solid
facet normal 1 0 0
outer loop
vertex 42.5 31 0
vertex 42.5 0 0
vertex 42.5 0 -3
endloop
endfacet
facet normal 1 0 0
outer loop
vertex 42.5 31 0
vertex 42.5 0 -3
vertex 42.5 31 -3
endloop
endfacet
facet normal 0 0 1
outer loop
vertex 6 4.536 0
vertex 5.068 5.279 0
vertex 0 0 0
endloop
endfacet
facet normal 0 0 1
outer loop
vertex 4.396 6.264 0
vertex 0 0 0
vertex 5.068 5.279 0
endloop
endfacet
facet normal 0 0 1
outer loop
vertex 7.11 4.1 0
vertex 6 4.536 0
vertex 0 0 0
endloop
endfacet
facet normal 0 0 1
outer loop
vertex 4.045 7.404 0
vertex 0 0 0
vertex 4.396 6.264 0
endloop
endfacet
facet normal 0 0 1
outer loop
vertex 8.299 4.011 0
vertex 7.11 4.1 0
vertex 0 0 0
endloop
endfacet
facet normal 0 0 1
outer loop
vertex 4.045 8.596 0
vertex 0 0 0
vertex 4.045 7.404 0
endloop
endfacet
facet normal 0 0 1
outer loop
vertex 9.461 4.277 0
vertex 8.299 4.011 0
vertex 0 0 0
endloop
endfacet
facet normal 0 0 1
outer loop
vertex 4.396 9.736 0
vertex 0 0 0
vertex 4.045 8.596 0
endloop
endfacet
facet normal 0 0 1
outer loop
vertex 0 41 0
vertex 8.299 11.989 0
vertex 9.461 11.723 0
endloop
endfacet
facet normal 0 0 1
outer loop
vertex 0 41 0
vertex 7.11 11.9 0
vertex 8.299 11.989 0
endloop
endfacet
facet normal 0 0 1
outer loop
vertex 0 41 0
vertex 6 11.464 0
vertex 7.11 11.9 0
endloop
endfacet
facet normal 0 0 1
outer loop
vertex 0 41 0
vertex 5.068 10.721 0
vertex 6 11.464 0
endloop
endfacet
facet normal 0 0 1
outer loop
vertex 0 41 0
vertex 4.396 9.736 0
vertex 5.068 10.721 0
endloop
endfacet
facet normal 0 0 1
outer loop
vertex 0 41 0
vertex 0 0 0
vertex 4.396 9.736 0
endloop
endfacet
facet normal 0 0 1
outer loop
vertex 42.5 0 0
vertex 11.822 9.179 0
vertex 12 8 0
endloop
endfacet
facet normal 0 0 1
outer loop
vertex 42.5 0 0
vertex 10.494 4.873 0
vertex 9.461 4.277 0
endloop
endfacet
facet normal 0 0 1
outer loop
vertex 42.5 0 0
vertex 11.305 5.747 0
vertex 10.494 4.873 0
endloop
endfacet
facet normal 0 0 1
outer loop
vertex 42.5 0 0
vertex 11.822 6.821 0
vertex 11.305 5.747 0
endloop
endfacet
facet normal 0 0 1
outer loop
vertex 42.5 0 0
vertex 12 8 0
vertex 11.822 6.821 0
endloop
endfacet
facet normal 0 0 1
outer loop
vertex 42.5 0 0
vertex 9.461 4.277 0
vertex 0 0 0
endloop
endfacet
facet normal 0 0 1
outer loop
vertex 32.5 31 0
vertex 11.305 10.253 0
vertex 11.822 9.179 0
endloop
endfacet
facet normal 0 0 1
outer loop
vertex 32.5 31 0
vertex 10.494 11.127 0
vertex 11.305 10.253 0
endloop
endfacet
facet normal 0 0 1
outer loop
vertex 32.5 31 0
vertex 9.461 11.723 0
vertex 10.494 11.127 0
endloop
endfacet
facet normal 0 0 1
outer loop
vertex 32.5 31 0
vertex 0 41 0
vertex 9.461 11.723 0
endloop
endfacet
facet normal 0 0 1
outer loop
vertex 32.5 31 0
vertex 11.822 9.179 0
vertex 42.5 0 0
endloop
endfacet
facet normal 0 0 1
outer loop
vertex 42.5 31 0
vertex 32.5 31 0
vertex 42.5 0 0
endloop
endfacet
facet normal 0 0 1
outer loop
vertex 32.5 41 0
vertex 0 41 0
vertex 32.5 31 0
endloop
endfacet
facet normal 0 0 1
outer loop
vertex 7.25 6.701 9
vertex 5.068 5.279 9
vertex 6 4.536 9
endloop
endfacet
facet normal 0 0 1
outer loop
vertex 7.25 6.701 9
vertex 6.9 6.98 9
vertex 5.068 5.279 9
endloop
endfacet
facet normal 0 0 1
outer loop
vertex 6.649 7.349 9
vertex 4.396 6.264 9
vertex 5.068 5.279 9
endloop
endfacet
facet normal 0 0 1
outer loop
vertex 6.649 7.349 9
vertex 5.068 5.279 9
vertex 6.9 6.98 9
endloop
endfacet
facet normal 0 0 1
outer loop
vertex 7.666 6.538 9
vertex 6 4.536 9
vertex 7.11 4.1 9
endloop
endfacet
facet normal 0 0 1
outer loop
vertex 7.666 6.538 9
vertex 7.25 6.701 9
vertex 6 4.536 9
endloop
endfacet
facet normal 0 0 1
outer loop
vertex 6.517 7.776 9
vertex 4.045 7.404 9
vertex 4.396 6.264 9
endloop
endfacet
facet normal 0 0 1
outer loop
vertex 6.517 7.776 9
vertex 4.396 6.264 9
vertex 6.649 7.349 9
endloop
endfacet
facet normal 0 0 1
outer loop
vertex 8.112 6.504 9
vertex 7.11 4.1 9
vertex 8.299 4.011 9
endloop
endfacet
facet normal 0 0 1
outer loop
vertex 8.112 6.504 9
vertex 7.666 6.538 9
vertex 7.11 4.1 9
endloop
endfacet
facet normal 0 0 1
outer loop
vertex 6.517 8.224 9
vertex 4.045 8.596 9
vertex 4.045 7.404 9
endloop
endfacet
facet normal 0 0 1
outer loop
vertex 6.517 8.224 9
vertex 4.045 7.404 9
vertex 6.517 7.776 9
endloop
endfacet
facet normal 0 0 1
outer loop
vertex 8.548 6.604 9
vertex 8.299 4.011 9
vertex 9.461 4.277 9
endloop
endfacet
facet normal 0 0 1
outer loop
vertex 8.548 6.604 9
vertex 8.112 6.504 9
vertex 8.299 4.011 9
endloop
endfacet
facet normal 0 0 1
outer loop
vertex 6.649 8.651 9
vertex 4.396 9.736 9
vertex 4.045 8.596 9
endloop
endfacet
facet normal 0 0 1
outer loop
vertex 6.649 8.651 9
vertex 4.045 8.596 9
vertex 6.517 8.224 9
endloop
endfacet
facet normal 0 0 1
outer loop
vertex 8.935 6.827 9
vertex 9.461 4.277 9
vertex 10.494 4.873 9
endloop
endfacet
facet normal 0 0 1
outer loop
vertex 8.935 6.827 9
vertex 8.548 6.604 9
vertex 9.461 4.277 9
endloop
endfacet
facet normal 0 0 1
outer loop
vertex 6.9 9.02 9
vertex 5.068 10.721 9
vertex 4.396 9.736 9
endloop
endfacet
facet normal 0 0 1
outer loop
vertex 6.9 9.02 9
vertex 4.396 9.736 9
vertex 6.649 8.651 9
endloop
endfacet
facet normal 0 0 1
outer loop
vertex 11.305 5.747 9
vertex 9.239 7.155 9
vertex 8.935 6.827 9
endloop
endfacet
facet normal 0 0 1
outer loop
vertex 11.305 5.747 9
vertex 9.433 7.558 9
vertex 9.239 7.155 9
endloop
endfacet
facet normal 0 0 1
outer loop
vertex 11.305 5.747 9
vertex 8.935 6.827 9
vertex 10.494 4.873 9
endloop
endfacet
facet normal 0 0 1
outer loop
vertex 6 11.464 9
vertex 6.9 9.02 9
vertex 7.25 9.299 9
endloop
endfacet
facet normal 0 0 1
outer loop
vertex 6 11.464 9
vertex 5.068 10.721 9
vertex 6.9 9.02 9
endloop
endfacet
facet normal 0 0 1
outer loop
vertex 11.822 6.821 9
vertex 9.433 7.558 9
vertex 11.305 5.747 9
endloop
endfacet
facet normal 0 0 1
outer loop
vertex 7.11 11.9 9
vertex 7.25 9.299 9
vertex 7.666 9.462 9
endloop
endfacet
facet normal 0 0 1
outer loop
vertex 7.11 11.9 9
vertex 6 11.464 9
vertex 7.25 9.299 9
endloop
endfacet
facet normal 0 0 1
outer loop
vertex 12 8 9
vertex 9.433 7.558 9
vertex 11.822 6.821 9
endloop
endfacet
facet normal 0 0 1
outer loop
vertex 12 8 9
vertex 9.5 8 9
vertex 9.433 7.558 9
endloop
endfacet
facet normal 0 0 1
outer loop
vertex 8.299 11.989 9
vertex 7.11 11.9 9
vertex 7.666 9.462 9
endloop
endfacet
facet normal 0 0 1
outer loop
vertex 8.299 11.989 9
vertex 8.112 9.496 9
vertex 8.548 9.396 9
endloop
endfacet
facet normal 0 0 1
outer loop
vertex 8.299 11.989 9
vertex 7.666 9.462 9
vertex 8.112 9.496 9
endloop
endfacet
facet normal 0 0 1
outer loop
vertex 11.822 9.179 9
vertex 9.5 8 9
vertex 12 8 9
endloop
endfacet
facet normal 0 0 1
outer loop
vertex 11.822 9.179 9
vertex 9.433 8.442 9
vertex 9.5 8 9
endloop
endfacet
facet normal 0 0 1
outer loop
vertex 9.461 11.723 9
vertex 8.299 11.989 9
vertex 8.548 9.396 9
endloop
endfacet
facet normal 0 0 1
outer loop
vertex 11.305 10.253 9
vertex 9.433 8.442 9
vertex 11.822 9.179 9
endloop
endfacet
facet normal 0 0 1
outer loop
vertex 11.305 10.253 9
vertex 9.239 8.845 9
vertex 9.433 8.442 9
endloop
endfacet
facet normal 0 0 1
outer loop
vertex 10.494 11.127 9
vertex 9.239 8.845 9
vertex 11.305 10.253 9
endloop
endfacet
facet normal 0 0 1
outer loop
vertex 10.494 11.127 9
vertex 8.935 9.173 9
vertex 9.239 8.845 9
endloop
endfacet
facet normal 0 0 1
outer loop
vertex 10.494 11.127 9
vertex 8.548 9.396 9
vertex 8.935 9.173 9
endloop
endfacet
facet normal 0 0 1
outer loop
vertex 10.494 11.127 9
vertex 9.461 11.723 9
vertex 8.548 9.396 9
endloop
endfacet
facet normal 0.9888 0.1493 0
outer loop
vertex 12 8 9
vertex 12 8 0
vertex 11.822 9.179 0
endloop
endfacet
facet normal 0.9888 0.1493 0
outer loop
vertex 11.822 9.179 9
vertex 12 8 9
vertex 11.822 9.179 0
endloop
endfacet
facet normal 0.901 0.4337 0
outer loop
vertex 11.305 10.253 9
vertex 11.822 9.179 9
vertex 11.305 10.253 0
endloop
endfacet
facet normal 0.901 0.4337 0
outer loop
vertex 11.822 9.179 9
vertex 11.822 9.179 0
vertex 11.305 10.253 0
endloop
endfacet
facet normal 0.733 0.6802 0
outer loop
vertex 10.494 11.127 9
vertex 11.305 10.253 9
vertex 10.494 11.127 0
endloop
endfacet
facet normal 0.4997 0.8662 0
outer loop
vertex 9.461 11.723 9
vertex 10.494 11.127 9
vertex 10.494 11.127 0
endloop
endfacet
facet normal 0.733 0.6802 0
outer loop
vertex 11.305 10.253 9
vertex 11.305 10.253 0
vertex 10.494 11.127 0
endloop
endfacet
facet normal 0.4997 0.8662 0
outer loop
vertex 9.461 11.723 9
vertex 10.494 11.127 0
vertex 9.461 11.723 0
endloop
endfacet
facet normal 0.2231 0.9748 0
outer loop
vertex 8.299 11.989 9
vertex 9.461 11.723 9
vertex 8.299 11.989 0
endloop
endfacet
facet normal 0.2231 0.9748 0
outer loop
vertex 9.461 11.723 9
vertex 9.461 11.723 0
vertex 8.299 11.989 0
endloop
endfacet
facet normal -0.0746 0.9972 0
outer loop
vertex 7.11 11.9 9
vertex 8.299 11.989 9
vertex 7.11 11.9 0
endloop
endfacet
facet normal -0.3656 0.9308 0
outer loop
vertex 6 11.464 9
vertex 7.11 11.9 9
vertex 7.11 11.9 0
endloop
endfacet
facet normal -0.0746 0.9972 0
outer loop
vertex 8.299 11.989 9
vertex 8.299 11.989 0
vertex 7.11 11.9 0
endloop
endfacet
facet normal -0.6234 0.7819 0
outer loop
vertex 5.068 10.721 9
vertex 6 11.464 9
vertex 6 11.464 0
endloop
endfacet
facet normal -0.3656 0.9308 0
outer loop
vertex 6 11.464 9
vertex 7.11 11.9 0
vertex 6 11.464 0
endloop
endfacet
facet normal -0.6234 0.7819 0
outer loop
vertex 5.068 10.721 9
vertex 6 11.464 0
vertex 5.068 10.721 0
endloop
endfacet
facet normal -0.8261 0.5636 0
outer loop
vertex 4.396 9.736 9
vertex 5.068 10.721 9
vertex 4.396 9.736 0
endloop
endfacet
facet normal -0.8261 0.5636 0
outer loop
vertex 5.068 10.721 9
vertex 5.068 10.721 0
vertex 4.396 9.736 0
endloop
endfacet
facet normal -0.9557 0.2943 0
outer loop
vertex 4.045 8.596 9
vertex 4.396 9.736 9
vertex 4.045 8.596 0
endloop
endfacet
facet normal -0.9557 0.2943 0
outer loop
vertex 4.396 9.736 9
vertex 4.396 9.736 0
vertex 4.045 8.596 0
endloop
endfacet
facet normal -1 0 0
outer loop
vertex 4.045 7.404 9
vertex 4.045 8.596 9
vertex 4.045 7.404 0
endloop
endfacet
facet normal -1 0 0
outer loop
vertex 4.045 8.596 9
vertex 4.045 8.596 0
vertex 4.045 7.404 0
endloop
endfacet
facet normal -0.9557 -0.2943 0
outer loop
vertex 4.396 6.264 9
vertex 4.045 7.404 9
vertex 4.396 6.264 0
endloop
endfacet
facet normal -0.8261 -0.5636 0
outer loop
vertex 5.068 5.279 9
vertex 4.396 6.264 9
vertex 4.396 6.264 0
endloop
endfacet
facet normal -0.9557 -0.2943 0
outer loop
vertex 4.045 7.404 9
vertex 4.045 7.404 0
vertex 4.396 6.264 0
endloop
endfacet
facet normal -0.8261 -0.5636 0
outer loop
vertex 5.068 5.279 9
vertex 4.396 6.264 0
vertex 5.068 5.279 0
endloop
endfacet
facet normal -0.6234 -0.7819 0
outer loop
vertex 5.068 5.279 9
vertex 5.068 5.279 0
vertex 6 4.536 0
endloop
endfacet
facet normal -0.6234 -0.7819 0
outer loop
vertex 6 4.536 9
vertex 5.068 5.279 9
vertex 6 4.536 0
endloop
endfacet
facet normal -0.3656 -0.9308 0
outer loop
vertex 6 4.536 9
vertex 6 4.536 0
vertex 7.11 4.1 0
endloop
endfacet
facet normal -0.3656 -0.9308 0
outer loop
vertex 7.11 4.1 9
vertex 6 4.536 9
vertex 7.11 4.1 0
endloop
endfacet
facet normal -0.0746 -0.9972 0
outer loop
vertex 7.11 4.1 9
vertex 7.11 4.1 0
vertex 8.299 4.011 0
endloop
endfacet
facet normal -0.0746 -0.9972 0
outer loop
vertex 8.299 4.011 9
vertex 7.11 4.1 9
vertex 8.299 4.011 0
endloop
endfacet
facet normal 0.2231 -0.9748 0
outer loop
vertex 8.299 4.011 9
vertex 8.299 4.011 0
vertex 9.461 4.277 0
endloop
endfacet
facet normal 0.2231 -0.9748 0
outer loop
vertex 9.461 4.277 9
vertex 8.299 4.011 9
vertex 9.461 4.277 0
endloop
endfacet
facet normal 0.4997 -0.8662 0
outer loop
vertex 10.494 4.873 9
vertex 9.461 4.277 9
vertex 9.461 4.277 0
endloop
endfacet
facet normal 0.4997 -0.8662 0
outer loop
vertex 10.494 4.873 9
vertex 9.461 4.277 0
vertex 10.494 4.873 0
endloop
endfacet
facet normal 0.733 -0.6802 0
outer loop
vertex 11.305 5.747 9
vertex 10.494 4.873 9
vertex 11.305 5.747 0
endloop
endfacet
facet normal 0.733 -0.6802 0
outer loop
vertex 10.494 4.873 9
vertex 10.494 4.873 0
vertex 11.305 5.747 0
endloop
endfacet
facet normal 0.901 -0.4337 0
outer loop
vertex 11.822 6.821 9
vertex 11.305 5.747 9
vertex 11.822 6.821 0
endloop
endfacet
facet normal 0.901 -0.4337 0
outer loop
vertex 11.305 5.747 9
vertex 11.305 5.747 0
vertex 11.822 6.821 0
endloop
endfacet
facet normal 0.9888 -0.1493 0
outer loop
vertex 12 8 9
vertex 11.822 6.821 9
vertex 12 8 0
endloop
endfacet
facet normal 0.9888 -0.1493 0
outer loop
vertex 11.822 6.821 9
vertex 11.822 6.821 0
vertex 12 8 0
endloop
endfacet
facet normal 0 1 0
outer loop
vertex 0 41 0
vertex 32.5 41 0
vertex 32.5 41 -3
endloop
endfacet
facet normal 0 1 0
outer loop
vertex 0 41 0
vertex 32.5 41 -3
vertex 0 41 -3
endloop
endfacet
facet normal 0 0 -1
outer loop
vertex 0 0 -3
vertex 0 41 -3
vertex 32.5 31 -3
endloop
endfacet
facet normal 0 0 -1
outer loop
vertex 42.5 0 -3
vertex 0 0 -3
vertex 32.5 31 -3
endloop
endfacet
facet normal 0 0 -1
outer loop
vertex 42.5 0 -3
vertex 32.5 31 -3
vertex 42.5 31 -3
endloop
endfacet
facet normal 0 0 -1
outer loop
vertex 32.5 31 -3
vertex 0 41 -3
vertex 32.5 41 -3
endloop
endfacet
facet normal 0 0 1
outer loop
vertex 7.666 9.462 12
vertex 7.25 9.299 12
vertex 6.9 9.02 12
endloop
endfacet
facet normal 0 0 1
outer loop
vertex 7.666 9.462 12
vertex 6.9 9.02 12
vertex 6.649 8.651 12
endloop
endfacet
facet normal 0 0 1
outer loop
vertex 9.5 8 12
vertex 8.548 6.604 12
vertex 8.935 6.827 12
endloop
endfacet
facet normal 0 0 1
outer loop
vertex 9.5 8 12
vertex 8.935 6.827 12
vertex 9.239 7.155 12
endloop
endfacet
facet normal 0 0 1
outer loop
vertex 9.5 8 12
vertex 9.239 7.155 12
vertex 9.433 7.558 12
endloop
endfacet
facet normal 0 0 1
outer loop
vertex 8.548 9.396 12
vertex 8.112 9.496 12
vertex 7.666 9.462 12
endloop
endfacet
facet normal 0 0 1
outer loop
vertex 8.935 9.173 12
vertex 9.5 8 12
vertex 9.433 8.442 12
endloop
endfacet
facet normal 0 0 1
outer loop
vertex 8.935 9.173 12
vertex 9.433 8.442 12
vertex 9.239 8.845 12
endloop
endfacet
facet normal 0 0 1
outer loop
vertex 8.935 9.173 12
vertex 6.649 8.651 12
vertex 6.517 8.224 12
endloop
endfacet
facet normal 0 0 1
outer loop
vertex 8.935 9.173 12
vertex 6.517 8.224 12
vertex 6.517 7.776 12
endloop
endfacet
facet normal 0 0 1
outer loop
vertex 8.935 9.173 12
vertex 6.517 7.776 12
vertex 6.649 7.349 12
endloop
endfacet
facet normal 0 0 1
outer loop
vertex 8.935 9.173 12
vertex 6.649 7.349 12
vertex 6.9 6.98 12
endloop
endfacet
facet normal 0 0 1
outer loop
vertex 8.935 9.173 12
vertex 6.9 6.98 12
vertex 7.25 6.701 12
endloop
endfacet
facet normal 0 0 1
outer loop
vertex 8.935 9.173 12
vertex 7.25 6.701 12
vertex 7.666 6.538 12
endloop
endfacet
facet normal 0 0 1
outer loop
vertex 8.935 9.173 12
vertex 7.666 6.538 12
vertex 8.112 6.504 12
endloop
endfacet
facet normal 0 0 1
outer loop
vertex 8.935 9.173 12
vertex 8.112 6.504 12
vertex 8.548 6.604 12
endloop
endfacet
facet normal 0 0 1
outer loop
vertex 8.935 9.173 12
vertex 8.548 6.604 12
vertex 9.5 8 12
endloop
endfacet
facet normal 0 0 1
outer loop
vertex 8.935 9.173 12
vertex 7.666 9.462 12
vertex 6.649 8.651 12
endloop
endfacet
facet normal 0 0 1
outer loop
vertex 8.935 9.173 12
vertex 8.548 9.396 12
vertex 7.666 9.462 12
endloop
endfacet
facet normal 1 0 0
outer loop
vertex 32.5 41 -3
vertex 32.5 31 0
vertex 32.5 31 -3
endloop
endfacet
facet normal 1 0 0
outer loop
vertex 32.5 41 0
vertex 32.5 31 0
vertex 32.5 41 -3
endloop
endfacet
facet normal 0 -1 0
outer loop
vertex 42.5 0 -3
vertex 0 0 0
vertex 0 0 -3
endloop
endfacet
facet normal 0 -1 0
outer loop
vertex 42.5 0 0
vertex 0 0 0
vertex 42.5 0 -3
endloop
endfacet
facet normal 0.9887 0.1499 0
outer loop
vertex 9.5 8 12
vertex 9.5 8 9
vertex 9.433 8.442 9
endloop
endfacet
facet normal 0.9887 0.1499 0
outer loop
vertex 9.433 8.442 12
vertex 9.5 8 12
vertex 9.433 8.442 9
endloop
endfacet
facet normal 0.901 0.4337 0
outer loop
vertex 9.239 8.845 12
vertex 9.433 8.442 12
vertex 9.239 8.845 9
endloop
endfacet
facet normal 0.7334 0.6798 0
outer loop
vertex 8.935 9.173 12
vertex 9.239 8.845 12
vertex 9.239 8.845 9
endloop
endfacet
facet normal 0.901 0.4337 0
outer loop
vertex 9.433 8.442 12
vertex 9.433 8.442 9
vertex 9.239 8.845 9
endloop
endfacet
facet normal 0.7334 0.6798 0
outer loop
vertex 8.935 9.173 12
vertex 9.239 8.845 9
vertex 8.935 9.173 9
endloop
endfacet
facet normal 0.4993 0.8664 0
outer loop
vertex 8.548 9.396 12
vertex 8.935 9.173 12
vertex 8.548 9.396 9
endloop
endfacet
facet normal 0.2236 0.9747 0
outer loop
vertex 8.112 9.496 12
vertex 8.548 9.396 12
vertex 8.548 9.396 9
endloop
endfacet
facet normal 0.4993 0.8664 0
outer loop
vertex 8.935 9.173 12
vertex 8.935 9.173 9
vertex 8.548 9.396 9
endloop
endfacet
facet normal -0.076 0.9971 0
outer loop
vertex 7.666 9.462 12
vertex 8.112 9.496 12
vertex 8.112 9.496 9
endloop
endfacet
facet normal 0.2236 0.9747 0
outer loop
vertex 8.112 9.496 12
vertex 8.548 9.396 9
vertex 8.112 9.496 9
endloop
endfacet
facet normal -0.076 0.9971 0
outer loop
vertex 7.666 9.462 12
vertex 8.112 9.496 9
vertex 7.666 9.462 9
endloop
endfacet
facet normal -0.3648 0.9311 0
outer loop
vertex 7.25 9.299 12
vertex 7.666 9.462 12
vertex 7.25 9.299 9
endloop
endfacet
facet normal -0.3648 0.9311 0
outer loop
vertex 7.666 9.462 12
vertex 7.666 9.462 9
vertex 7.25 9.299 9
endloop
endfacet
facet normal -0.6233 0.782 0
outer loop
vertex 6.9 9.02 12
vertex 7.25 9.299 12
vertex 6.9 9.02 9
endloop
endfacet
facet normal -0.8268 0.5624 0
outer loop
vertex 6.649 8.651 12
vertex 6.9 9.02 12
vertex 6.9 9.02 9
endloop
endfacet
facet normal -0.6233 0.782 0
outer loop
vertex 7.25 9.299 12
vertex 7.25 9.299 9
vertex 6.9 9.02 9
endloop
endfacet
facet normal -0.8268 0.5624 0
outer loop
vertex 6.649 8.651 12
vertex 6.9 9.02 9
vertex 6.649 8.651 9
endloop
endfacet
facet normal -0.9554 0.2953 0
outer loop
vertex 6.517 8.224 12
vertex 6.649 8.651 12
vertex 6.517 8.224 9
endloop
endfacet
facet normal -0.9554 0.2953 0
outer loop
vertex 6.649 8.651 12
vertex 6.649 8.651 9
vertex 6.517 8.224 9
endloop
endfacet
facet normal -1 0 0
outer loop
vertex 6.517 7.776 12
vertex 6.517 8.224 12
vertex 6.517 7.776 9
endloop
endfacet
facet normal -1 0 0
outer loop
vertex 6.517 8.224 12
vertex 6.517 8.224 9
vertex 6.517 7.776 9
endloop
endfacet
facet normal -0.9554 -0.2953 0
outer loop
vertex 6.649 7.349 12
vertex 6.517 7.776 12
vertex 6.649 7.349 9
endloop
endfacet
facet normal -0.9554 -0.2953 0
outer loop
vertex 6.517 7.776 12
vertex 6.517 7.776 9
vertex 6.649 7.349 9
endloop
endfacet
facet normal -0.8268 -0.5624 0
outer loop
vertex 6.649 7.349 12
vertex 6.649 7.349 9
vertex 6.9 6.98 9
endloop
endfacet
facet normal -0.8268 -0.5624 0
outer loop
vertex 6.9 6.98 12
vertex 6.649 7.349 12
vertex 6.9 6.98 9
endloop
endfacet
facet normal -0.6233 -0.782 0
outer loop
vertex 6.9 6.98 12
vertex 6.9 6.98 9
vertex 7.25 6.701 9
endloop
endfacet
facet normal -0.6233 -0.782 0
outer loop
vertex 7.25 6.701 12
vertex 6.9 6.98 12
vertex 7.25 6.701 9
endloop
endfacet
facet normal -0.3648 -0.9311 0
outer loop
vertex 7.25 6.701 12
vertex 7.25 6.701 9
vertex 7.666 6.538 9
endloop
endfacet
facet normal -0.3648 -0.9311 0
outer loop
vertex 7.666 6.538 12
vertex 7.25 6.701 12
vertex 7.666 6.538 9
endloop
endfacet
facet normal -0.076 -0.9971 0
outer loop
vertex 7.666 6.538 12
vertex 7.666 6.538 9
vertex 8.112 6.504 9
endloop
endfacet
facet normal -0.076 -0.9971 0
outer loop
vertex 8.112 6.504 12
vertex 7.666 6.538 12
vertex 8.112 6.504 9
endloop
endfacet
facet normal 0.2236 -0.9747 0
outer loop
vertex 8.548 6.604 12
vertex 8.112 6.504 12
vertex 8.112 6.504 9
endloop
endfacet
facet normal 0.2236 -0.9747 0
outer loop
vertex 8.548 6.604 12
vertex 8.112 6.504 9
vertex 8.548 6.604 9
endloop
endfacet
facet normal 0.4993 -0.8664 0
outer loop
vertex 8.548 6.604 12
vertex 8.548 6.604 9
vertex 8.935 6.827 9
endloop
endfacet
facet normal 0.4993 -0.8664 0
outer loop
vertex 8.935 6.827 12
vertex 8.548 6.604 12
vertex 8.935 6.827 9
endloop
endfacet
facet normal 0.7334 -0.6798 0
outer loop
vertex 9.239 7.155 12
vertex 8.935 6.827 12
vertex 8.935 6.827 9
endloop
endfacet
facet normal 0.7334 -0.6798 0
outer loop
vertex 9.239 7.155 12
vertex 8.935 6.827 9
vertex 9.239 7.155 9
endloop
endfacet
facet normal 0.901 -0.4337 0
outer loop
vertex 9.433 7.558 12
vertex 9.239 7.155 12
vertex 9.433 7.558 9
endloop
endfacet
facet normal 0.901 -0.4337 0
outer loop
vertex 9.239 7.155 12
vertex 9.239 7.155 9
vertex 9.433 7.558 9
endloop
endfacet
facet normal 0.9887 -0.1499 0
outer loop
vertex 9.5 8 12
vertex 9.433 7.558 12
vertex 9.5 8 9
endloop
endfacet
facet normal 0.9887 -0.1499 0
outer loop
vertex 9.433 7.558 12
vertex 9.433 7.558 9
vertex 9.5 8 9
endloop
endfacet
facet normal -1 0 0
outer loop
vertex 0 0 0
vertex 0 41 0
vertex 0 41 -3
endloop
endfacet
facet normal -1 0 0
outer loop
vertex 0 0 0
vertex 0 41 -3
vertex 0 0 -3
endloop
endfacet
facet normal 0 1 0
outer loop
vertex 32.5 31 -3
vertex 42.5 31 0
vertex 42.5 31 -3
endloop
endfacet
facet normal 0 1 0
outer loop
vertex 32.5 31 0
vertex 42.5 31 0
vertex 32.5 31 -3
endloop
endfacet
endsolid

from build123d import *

# Parameters (mm, degrees)
F0_R     = 4
F1_DEPTH = 3
F2_DEPTH = 9
F3_R     = 1.5
F4_DEPTH = 3


with BuildPart() as f1:
    # F0 (on Top) → F1 (new body)
    with BuildSketch(Plane.XY):
        Polygon((0, 41), (0, 0), (42.5, 0), (42.5, 31), (32.5, 31), (32.5, 41), align=None)
        with Locations((8, 8)):
            Circle(F0_R, mode=Mode.SUBTRACT)
        with Locations((8, 8)):
            Circle(F0_R)
    extrude(amount=-F1_DEPTH)

    # F0 (on Top) → F2 (join)
    with BuildSketch(Plane.XY):
        with Locations((8, 8)):
            Circle(F0_R)
    extrude(amount=F2_DEPTH)

    # F3 (on face) → F4 (join)
    with BuildSketch(Plane.XY.offset(9)):
        with Locations((8, 8)):
            Circle(F3_R)
    extrude(amount=F4_DEPTH)


solid = f1.part
